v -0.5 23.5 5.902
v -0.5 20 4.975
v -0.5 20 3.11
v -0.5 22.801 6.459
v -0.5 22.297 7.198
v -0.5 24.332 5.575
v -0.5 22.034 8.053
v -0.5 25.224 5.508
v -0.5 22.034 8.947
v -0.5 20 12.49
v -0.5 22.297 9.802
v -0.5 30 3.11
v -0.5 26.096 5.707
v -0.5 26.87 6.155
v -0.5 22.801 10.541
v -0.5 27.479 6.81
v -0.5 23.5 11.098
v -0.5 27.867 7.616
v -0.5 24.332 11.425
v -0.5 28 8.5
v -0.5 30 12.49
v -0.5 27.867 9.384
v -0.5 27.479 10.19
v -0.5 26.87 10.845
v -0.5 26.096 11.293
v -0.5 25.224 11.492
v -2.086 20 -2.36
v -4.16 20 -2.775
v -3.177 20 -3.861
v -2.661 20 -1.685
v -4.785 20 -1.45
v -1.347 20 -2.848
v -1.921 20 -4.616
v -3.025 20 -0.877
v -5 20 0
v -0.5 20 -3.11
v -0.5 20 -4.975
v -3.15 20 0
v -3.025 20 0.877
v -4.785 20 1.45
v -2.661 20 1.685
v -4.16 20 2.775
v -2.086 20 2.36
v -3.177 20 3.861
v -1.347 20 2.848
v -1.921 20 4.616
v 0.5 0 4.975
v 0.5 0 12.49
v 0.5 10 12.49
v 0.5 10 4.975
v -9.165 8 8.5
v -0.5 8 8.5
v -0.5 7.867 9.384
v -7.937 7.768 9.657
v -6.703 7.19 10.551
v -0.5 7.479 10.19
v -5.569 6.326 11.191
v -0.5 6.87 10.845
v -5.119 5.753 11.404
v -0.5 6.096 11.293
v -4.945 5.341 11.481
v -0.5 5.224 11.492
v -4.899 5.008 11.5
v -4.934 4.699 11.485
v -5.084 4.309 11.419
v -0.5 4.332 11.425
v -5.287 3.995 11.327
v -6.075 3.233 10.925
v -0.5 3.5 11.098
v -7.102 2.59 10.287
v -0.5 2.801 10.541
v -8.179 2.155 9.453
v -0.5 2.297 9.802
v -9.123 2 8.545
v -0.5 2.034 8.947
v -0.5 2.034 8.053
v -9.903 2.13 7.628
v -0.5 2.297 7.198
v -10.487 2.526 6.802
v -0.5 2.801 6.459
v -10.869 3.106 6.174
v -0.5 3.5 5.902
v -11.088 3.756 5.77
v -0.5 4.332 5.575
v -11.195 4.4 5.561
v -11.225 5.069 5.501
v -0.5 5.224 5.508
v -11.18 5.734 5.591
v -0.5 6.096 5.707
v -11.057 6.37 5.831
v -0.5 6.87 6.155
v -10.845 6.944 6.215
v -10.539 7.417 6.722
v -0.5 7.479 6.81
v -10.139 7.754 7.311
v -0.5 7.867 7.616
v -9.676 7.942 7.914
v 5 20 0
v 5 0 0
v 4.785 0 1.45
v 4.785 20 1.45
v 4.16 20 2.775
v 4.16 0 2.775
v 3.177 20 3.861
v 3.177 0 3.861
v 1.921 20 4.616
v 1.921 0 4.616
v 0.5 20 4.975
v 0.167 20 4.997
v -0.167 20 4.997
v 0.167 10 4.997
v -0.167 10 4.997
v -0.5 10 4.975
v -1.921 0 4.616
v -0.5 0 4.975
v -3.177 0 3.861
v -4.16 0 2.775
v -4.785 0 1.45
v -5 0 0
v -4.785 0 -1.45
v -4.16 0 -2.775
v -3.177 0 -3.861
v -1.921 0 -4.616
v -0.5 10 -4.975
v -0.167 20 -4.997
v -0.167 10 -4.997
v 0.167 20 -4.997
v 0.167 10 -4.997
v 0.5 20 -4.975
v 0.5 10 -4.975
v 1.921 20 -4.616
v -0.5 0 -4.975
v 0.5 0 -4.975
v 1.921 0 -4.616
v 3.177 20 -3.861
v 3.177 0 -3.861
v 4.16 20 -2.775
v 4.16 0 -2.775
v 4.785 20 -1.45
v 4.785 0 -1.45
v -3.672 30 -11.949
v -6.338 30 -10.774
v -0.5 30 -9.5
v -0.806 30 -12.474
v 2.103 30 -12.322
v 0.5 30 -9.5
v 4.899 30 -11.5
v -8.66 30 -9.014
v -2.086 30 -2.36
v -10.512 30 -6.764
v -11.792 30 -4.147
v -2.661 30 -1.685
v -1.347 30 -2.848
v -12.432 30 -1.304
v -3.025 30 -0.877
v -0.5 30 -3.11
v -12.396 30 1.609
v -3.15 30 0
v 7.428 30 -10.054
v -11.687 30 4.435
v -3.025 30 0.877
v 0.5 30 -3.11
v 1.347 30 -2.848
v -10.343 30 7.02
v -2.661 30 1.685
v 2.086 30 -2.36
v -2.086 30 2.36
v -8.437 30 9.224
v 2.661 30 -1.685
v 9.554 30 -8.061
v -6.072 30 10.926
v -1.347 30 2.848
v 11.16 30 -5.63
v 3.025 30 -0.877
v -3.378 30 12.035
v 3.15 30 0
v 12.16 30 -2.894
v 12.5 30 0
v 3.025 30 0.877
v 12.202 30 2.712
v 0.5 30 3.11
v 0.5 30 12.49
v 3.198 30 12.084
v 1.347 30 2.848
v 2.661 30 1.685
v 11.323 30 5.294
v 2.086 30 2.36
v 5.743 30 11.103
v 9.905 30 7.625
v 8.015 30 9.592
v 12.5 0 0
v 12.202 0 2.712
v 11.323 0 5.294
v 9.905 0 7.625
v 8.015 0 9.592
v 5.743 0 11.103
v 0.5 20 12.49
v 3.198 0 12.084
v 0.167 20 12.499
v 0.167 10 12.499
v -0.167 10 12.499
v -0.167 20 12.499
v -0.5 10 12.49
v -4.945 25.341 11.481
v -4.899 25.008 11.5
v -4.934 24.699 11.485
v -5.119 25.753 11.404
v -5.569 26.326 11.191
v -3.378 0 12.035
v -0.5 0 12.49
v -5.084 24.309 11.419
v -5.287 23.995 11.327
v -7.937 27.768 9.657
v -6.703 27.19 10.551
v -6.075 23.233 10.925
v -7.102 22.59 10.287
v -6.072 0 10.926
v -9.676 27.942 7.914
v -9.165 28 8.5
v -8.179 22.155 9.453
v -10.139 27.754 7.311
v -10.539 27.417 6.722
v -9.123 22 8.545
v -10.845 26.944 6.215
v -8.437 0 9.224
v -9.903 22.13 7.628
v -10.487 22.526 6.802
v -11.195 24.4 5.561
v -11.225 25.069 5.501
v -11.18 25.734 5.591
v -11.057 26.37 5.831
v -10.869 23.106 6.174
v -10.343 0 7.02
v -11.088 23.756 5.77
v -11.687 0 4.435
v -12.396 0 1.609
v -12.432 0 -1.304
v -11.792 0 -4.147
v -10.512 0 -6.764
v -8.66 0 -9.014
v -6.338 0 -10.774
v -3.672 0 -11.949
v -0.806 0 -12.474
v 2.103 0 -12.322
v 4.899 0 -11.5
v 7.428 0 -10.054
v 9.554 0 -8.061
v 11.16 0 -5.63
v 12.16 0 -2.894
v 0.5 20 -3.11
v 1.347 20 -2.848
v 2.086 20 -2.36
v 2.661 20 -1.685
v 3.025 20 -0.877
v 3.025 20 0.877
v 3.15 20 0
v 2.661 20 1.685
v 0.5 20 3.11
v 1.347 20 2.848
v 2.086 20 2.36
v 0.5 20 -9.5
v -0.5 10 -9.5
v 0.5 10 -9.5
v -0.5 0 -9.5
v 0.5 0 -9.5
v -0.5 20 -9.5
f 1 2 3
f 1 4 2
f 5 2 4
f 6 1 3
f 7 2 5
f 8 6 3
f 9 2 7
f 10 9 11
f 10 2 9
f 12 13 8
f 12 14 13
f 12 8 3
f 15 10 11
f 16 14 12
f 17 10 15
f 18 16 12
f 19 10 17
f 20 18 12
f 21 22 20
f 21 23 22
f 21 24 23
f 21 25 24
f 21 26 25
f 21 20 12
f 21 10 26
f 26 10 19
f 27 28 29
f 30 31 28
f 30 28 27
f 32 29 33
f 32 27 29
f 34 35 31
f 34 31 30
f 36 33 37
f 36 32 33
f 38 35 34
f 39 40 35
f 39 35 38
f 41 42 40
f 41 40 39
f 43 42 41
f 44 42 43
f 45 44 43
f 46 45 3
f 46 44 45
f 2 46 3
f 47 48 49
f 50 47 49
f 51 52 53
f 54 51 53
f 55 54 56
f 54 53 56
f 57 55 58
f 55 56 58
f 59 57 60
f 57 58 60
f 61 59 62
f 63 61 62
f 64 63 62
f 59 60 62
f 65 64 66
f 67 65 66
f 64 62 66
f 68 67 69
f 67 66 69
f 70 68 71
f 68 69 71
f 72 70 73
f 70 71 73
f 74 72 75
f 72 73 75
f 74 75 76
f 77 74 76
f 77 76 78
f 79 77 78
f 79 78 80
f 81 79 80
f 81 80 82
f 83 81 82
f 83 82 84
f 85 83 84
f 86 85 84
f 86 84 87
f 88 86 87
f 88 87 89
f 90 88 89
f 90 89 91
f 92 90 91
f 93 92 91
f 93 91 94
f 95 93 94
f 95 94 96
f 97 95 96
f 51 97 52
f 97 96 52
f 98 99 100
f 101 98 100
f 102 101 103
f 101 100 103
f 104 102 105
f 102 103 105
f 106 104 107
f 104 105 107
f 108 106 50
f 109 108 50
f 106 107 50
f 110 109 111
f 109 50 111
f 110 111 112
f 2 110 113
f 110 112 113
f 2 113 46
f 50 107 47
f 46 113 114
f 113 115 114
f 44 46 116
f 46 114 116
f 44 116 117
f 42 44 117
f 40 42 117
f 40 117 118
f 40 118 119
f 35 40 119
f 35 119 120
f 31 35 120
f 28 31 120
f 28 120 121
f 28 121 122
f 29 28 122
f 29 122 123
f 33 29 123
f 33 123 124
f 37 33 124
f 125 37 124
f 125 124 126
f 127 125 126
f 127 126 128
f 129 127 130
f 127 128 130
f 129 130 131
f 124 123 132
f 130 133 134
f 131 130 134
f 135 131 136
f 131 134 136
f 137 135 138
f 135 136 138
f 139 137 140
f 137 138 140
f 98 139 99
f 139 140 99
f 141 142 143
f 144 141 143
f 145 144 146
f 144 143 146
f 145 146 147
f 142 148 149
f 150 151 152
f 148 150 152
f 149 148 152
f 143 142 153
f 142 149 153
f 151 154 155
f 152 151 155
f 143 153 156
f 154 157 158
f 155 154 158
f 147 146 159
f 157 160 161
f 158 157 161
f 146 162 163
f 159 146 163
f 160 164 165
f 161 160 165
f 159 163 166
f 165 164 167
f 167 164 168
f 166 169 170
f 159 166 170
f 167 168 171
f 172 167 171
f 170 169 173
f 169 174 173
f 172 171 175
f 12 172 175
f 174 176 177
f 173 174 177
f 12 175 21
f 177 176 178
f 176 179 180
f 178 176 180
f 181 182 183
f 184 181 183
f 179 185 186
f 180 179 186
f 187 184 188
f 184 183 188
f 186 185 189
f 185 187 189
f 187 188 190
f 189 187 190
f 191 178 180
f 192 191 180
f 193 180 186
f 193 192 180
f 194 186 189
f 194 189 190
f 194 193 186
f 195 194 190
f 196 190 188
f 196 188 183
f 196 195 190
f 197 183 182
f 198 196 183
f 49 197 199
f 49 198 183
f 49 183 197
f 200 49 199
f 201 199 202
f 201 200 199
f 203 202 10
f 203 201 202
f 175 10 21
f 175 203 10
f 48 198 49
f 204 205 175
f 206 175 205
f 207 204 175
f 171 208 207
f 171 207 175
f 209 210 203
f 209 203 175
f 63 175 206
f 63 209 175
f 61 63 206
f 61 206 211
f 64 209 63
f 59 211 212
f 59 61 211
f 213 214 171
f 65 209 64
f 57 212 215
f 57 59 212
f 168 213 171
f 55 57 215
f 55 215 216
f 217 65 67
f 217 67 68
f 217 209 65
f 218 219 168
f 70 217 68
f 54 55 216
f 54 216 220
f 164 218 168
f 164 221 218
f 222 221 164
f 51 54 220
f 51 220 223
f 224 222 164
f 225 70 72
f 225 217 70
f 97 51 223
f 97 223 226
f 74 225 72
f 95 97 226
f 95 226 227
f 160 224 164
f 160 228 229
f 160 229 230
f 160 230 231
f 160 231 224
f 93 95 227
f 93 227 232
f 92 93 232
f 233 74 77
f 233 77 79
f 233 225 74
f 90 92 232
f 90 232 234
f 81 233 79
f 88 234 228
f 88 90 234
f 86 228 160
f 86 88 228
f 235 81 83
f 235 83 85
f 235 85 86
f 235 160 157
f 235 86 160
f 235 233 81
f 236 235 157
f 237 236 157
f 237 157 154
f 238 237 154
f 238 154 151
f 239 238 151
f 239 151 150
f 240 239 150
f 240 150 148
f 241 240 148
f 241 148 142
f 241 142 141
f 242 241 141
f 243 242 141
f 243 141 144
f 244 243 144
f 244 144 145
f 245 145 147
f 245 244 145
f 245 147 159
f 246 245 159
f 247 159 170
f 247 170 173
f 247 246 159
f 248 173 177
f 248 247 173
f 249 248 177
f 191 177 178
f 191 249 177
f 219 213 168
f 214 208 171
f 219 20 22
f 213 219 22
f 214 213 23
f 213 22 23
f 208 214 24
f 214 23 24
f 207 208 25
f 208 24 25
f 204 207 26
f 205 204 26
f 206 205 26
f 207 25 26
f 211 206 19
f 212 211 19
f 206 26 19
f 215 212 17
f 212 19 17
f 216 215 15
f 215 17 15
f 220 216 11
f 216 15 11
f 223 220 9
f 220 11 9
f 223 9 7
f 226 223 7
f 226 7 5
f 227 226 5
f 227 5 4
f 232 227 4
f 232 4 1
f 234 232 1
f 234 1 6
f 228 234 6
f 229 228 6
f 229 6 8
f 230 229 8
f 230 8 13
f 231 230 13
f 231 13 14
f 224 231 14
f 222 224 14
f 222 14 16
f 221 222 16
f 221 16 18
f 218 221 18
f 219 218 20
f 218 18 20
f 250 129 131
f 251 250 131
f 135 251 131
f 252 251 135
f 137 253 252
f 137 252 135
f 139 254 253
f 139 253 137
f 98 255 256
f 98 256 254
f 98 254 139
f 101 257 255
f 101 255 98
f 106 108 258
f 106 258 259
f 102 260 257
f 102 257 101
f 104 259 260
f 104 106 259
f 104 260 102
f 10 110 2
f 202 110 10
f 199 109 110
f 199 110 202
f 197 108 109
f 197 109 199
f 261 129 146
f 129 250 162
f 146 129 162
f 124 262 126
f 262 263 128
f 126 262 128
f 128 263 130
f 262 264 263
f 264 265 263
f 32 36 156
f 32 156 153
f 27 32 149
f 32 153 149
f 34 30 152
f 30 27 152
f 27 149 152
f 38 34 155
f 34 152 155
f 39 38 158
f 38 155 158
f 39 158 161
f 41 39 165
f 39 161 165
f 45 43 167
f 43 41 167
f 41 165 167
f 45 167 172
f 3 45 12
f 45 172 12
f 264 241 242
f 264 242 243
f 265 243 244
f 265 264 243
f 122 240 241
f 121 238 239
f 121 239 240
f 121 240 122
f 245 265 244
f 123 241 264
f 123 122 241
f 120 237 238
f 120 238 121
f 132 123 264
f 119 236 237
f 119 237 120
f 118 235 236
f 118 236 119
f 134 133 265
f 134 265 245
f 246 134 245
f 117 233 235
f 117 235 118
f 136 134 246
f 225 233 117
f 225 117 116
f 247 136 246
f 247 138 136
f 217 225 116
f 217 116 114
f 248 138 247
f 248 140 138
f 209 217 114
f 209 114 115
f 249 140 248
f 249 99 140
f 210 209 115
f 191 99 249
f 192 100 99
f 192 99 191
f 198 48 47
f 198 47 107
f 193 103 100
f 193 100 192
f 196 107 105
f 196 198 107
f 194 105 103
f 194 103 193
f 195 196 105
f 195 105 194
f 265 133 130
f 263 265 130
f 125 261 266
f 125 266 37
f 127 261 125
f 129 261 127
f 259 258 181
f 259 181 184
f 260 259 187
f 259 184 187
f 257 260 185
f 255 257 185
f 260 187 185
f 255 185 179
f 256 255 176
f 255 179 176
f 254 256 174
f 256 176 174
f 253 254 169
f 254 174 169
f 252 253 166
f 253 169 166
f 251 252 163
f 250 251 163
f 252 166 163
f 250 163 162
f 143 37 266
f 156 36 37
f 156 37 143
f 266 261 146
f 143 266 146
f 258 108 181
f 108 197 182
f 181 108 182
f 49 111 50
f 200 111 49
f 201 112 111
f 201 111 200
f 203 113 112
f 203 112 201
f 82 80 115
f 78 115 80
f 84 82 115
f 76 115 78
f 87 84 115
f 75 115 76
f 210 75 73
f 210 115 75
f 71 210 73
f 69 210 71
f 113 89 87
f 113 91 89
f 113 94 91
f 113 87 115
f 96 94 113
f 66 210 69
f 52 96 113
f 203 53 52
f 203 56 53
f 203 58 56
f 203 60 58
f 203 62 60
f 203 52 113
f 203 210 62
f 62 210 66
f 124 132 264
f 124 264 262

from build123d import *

# Parameters (mm, degrees)
F0_R          = 12.5
F1_DEPTH      = 30
F2_R          = 5
F3_DEPTH      = 20
F4_R          = 3.15
F5_DEPTH      = 10
F6_W          = 10
F6_H          = 22
F7_DEPTH      = 0.5
F7_DEPTH_BACK = 0.5
F8_R          = 3
F9_DEPTH      = 12.501


with BuildPart() as f1:
    # F0 (on Front) → F1 (new body)
    with BuildSketch(Plane.XZ):
        Circle(F0_R)
    extrude(amount=-F1_DEPTH)

    # F2 (on face) → F3 (cut)
    with BuildSketch(Plane.XZ):
        Circle(F2_R)
    extrude(amount=-F3_DEPTH, mode=Mode.SUBTRACT)

    # F4 (on face) → F5 (cut, through all)
    with BuildSketch(Plane(origin=(0, 30, 0), x_dir=(-1, 0, 0), z_dir=(0, 1, 0))):
        Circle(F4_R)
    extrude(amount=-F5_DEPTH, mode=Mode.SUBTRACT)

    # F6 (on Right) → F7 (cut, two sides)
    with BuildSketch(Plane.YZ) as f7_sk:
        with Locations((5, 1.5)):
            Rectangle(F6_W, F6_H)
        with Locations((25, 1.5)):
            Rectangle(F6_W, F6_H)
    extrude(amount=-F7_DEPTH, mode=Mode.SUBTRACT)
    extrude(f7_sk.sketch, amount=F7_DEPTH_BACK, mode=Mode.SUBTRACT)

    # F8 (on Right) → F9 (cut, through all)
    with BuildSketch(Plane.YZ):
        with Locations((5, 8.5)):
            Circle(F8_R)
        with Locations((25, 8.5)):
            Circle(F8_R)
    extrude(amount=-F9_DEPTH, mode=Mode.SUBTRACT)


solid = f1.part
